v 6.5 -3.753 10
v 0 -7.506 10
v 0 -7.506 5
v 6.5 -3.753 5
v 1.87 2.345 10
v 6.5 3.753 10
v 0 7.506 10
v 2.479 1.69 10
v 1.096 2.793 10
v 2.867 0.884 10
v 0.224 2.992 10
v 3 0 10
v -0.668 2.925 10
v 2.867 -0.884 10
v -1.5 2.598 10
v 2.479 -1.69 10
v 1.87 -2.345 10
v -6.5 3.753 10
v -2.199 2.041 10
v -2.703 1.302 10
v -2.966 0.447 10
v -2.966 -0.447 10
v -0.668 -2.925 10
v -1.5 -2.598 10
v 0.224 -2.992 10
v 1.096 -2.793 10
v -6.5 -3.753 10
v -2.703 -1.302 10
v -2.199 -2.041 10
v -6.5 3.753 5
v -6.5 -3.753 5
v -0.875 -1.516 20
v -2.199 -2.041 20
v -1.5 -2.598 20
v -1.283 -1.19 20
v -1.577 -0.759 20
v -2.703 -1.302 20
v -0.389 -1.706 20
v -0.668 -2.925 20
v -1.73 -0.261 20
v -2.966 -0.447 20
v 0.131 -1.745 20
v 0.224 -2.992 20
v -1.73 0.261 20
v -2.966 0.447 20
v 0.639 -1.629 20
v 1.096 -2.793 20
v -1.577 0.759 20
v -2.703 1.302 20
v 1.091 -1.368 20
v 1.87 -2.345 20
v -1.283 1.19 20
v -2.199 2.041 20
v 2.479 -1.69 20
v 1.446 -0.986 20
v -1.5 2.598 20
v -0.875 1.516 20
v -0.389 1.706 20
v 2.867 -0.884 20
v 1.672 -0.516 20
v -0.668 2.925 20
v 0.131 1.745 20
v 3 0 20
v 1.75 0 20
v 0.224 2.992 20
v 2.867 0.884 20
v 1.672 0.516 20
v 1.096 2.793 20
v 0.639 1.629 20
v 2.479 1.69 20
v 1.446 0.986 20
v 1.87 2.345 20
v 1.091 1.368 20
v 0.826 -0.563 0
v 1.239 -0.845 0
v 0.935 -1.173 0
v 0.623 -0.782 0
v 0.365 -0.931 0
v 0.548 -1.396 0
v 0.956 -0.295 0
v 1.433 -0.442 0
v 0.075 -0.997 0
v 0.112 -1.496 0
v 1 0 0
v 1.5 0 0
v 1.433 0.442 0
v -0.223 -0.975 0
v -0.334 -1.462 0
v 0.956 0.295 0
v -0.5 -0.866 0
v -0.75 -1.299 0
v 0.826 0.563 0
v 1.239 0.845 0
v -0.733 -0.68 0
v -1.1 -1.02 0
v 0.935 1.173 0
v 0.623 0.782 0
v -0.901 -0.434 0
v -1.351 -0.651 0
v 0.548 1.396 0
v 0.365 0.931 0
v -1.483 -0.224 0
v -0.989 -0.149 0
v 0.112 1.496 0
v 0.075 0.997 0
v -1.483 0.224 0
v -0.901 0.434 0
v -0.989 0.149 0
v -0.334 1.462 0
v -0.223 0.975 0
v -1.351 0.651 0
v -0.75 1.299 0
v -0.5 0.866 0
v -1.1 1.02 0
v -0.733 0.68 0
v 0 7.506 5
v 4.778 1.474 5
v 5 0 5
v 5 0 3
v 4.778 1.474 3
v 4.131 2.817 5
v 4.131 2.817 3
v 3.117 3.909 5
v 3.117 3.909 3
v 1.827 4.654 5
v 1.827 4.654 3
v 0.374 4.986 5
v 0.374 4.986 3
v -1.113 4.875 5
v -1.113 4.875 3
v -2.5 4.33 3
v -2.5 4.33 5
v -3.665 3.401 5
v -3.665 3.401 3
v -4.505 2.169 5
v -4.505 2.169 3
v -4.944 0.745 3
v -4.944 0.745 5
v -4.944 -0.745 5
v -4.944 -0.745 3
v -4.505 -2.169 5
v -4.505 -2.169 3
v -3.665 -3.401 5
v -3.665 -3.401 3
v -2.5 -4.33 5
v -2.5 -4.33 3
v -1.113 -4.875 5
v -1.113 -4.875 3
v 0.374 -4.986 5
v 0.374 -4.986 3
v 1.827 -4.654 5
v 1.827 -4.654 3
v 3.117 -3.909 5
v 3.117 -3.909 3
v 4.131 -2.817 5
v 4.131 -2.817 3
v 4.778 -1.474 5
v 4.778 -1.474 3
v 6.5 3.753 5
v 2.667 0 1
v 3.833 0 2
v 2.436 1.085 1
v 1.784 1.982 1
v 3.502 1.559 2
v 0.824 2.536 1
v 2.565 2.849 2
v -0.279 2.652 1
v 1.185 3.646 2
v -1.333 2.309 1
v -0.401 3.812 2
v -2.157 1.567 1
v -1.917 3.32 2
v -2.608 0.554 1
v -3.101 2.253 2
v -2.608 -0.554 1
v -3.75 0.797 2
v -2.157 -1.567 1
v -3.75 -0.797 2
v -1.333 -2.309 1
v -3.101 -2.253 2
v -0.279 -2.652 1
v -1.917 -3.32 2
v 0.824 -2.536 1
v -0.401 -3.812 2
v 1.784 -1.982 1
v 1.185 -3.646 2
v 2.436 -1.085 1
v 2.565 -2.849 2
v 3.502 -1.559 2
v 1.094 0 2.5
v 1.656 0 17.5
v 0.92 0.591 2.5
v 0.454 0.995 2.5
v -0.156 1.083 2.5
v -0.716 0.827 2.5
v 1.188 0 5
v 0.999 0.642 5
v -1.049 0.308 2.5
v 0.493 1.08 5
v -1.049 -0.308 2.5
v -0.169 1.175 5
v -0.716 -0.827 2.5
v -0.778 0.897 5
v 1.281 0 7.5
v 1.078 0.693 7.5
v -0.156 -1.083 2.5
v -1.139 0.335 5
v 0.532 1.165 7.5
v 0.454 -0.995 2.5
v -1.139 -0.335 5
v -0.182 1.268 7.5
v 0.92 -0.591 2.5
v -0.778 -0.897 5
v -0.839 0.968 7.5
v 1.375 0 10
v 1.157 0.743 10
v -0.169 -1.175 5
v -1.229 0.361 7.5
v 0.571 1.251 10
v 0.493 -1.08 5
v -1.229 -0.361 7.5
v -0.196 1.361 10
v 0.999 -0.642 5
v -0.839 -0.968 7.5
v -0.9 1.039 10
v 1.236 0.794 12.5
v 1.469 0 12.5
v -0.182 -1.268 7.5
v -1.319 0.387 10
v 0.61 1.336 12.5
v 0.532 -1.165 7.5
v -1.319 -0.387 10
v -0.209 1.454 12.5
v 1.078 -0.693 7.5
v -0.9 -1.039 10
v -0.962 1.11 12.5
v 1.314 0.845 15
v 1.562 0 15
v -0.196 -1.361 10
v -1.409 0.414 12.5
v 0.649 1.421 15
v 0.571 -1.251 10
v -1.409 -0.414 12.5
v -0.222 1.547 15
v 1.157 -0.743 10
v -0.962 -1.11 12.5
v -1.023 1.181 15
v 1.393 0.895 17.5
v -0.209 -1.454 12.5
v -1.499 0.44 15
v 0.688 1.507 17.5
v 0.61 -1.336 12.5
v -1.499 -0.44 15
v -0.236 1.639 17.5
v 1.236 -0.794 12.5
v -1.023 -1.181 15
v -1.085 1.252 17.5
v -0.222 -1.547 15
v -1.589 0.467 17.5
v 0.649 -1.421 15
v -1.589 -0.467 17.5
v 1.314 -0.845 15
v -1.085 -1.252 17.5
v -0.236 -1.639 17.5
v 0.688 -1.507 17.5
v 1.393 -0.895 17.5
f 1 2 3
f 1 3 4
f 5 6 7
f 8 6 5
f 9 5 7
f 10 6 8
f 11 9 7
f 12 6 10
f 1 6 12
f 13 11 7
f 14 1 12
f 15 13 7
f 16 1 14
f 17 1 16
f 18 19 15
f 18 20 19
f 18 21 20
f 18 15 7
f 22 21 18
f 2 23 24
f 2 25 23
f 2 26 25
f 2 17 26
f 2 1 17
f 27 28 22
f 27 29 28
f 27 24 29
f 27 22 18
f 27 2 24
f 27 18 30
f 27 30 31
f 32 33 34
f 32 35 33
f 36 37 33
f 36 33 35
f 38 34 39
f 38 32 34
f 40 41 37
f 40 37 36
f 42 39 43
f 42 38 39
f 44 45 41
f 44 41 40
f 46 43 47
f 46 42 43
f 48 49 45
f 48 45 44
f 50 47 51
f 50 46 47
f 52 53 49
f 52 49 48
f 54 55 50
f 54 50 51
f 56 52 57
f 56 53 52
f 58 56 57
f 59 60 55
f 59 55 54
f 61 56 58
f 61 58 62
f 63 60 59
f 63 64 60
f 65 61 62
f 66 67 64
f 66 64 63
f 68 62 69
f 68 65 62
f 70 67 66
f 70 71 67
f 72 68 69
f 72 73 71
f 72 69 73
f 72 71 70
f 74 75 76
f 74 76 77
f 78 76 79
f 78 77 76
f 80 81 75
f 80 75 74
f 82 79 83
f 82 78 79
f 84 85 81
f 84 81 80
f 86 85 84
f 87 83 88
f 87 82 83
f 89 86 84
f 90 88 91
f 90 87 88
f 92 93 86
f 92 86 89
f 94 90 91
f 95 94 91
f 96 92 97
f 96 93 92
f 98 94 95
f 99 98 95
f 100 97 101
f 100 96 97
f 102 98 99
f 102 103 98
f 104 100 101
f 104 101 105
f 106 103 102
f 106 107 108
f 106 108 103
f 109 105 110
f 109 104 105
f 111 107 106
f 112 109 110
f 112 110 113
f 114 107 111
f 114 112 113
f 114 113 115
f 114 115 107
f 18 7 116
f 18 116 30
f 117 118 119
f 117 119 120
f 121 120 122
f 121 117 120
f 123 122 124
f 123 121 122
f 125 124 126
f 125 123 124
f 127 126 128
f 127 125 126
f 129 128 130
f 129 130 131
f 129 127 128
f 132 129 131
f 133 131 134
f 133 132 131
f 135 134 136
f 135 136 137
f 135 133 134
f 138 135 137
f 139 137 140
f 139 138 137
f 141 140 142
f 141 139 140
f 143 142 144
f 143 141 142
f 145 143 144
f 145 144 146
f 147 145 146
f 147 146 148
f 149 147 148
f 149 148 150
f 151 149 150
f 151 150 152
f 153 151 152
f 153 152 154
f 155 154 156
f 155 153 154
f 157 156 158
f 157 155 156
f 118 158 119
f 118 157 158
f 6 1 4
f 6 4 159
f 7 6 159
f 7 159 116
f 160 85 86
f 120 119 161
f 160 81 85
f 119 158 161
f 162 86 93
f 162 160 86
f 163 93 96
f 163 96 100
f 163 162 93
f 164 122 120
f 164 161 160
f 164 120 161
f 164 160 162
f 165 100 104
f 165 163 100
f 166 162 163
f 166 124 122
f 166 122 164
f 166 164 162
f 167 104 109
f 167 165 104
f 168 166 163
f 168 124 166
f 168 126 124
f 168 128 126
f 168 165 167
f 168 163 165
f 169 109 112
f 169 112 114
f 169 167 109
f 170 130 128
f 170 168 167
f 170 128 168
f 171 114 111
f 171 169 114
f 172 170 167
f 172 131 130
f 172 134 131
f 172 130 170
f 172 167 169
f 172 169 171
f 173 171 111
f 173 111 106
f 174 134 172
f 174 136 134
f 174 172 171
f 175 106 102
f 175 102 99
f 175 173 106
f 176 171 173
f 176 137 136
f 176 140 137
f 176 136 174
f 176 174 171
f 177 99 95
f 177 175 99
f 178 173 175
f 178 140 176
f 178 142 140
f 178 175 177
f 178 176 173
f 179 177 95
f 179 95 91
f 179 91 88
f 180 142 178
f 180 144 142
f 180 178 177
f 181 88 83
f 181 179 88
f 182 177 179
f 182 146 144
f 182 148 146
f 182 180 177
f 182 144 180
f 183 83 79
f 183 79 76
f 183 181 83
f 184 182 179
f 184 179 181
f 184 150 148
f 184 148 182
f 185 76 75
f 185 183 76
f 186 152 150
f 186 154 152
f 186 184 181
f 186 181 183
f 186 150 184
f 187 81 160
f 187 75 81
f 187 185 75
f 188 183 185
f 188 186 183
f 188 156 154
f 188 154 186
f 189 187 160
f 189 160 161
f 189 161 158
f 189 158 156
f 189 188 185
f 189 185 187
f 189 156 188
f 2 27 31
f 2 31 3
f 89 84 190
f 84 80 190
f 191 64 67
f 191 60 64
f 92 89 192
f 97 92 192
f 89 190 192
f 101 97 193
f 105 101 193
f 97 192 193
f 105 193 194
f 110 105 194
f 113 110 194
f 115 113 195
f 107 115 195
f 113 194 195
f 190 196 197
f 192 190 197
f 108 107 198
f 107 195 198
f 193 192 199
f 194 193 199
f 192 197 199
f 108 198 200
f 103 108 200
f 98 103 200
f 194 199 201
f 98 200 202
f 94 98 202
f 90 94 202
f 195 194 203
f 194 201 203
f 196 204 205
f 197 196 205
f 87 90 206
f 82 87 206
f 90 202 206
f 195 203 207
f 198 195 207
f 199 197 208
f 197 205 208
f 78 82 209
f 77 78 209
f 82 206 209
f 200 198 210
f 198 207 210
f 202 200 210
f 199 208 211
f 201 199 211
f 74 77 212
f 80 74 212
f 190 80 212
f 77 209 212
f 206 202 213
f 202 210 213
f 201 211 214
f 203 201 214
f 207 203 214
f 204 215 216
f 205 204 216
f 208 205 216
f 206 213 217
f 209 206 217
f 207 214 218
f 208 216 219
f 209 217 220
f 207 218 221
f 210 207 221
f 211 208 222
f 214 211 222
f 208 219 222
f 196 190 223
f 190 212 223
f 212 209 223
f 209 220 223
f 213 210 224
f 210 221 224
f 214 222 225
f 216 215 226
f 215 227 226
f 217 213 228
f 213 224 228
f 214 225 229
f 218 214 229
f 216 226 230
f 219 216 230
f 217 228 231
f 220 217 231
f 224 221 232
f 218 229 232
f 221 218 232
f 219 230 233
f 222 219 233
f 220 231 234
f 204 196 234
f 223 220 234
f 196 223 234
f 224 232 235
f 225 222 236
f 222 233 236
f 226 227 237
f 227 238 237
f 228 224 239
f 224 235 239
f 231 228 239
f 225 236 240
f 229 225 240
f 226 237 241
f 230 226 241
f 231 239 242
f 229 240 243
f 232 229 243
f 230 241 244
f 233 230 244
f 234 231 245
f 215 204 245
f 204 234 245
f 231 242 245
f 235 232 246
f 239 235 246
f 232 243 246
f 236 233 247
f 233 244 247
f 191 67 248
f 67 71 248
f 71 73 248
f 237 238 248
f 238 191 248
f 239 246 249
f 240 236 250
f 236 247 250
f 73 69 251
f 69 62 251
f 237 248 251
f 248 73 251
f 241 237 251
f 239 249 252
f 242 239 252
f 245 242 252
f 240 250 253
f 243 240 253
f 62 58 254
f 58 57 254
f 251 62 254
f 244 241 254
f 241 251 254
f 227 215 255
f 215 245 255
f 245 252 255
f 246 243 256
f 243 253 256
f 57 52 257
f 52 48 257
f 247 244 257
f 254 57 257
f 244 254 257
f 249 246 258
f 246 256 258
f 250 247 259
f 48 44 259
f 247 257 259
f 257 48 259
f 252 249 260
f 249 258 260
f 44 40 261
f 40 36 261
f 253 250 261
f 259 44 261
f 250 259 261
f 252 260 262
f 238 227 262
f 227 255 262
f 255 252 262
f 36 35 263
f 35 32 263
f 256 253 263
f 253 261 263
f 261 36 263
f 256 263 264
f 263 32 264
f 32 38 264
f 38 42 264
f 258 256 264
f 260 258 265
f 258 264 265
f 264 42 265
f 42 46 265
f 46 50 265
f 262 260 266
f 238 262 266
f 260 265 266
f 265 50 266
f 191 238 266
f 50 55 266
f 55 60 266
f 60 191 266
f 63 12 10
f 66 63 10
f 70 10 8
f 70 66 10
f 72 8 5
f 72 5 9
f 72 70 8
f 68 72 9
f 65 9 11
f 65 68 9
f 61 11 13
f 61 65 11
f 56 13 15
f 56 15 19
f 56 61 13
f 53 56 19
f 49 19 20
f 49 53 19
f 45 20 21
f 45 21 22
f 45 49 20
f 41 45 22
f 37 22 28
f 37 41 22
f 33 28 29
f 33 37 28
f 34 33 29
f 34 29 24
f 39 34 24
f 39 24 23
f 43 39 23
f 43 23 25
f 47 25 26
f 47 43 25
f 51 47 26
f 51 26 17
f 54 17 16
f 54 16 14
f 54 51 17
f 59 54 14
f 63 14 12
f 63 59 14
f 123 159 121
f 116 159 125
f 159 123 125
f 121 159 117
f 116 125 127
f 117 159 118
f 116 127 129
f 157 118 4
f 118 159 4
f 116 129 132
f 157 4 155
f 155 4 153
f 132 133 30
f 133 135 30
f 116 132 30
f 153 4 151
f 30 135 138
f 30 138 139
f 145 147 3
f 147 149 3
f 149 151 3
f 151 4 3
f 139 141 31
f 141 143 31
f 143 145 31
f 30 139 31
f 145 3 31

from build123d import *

# Parameters (mm, degrees)
PAD_DEPTH = 5


with BuildPart() as part:
    # Sketch → Revolution (revolve)
    with BuildSketch(Plane.XZ):
        Polygon((0, 20), (0, 0), (1.5, 0), (5, 3), (5, 10), (3, 10), (3, 20), align=None)
    revolve(axis=Axis((0, 0, 0), (0, 0, 1)))

    # Sketch001 (on Face4 of Revolution) → Pad (new body)
    with BuildSketch(Plane(origin=(0, 0, 10), x_dir=(-1, 0, 0), z_dir=(0, 0, 1))):
        Polygon((6.5, 3.752777), (0, 7.505553), (-6.5, 3.752777), (-6.5, -3.752777), (0, -7.505553), (6.5, -3.752777), align=None)
    extrude(amount=-PAD_DEPTH)

    # Sketch002 → Groove (revolve, cut)
    with BuildSketch(Plane.XZ):
        Polygon((1.75, 20), (0, 20), (0, 0), (1, 0), align=None)
    revolve(axis=Axis((0, 0, 0), (0, 0, 1)), mode=Mode.SUBTRACT)


solid = part.part
